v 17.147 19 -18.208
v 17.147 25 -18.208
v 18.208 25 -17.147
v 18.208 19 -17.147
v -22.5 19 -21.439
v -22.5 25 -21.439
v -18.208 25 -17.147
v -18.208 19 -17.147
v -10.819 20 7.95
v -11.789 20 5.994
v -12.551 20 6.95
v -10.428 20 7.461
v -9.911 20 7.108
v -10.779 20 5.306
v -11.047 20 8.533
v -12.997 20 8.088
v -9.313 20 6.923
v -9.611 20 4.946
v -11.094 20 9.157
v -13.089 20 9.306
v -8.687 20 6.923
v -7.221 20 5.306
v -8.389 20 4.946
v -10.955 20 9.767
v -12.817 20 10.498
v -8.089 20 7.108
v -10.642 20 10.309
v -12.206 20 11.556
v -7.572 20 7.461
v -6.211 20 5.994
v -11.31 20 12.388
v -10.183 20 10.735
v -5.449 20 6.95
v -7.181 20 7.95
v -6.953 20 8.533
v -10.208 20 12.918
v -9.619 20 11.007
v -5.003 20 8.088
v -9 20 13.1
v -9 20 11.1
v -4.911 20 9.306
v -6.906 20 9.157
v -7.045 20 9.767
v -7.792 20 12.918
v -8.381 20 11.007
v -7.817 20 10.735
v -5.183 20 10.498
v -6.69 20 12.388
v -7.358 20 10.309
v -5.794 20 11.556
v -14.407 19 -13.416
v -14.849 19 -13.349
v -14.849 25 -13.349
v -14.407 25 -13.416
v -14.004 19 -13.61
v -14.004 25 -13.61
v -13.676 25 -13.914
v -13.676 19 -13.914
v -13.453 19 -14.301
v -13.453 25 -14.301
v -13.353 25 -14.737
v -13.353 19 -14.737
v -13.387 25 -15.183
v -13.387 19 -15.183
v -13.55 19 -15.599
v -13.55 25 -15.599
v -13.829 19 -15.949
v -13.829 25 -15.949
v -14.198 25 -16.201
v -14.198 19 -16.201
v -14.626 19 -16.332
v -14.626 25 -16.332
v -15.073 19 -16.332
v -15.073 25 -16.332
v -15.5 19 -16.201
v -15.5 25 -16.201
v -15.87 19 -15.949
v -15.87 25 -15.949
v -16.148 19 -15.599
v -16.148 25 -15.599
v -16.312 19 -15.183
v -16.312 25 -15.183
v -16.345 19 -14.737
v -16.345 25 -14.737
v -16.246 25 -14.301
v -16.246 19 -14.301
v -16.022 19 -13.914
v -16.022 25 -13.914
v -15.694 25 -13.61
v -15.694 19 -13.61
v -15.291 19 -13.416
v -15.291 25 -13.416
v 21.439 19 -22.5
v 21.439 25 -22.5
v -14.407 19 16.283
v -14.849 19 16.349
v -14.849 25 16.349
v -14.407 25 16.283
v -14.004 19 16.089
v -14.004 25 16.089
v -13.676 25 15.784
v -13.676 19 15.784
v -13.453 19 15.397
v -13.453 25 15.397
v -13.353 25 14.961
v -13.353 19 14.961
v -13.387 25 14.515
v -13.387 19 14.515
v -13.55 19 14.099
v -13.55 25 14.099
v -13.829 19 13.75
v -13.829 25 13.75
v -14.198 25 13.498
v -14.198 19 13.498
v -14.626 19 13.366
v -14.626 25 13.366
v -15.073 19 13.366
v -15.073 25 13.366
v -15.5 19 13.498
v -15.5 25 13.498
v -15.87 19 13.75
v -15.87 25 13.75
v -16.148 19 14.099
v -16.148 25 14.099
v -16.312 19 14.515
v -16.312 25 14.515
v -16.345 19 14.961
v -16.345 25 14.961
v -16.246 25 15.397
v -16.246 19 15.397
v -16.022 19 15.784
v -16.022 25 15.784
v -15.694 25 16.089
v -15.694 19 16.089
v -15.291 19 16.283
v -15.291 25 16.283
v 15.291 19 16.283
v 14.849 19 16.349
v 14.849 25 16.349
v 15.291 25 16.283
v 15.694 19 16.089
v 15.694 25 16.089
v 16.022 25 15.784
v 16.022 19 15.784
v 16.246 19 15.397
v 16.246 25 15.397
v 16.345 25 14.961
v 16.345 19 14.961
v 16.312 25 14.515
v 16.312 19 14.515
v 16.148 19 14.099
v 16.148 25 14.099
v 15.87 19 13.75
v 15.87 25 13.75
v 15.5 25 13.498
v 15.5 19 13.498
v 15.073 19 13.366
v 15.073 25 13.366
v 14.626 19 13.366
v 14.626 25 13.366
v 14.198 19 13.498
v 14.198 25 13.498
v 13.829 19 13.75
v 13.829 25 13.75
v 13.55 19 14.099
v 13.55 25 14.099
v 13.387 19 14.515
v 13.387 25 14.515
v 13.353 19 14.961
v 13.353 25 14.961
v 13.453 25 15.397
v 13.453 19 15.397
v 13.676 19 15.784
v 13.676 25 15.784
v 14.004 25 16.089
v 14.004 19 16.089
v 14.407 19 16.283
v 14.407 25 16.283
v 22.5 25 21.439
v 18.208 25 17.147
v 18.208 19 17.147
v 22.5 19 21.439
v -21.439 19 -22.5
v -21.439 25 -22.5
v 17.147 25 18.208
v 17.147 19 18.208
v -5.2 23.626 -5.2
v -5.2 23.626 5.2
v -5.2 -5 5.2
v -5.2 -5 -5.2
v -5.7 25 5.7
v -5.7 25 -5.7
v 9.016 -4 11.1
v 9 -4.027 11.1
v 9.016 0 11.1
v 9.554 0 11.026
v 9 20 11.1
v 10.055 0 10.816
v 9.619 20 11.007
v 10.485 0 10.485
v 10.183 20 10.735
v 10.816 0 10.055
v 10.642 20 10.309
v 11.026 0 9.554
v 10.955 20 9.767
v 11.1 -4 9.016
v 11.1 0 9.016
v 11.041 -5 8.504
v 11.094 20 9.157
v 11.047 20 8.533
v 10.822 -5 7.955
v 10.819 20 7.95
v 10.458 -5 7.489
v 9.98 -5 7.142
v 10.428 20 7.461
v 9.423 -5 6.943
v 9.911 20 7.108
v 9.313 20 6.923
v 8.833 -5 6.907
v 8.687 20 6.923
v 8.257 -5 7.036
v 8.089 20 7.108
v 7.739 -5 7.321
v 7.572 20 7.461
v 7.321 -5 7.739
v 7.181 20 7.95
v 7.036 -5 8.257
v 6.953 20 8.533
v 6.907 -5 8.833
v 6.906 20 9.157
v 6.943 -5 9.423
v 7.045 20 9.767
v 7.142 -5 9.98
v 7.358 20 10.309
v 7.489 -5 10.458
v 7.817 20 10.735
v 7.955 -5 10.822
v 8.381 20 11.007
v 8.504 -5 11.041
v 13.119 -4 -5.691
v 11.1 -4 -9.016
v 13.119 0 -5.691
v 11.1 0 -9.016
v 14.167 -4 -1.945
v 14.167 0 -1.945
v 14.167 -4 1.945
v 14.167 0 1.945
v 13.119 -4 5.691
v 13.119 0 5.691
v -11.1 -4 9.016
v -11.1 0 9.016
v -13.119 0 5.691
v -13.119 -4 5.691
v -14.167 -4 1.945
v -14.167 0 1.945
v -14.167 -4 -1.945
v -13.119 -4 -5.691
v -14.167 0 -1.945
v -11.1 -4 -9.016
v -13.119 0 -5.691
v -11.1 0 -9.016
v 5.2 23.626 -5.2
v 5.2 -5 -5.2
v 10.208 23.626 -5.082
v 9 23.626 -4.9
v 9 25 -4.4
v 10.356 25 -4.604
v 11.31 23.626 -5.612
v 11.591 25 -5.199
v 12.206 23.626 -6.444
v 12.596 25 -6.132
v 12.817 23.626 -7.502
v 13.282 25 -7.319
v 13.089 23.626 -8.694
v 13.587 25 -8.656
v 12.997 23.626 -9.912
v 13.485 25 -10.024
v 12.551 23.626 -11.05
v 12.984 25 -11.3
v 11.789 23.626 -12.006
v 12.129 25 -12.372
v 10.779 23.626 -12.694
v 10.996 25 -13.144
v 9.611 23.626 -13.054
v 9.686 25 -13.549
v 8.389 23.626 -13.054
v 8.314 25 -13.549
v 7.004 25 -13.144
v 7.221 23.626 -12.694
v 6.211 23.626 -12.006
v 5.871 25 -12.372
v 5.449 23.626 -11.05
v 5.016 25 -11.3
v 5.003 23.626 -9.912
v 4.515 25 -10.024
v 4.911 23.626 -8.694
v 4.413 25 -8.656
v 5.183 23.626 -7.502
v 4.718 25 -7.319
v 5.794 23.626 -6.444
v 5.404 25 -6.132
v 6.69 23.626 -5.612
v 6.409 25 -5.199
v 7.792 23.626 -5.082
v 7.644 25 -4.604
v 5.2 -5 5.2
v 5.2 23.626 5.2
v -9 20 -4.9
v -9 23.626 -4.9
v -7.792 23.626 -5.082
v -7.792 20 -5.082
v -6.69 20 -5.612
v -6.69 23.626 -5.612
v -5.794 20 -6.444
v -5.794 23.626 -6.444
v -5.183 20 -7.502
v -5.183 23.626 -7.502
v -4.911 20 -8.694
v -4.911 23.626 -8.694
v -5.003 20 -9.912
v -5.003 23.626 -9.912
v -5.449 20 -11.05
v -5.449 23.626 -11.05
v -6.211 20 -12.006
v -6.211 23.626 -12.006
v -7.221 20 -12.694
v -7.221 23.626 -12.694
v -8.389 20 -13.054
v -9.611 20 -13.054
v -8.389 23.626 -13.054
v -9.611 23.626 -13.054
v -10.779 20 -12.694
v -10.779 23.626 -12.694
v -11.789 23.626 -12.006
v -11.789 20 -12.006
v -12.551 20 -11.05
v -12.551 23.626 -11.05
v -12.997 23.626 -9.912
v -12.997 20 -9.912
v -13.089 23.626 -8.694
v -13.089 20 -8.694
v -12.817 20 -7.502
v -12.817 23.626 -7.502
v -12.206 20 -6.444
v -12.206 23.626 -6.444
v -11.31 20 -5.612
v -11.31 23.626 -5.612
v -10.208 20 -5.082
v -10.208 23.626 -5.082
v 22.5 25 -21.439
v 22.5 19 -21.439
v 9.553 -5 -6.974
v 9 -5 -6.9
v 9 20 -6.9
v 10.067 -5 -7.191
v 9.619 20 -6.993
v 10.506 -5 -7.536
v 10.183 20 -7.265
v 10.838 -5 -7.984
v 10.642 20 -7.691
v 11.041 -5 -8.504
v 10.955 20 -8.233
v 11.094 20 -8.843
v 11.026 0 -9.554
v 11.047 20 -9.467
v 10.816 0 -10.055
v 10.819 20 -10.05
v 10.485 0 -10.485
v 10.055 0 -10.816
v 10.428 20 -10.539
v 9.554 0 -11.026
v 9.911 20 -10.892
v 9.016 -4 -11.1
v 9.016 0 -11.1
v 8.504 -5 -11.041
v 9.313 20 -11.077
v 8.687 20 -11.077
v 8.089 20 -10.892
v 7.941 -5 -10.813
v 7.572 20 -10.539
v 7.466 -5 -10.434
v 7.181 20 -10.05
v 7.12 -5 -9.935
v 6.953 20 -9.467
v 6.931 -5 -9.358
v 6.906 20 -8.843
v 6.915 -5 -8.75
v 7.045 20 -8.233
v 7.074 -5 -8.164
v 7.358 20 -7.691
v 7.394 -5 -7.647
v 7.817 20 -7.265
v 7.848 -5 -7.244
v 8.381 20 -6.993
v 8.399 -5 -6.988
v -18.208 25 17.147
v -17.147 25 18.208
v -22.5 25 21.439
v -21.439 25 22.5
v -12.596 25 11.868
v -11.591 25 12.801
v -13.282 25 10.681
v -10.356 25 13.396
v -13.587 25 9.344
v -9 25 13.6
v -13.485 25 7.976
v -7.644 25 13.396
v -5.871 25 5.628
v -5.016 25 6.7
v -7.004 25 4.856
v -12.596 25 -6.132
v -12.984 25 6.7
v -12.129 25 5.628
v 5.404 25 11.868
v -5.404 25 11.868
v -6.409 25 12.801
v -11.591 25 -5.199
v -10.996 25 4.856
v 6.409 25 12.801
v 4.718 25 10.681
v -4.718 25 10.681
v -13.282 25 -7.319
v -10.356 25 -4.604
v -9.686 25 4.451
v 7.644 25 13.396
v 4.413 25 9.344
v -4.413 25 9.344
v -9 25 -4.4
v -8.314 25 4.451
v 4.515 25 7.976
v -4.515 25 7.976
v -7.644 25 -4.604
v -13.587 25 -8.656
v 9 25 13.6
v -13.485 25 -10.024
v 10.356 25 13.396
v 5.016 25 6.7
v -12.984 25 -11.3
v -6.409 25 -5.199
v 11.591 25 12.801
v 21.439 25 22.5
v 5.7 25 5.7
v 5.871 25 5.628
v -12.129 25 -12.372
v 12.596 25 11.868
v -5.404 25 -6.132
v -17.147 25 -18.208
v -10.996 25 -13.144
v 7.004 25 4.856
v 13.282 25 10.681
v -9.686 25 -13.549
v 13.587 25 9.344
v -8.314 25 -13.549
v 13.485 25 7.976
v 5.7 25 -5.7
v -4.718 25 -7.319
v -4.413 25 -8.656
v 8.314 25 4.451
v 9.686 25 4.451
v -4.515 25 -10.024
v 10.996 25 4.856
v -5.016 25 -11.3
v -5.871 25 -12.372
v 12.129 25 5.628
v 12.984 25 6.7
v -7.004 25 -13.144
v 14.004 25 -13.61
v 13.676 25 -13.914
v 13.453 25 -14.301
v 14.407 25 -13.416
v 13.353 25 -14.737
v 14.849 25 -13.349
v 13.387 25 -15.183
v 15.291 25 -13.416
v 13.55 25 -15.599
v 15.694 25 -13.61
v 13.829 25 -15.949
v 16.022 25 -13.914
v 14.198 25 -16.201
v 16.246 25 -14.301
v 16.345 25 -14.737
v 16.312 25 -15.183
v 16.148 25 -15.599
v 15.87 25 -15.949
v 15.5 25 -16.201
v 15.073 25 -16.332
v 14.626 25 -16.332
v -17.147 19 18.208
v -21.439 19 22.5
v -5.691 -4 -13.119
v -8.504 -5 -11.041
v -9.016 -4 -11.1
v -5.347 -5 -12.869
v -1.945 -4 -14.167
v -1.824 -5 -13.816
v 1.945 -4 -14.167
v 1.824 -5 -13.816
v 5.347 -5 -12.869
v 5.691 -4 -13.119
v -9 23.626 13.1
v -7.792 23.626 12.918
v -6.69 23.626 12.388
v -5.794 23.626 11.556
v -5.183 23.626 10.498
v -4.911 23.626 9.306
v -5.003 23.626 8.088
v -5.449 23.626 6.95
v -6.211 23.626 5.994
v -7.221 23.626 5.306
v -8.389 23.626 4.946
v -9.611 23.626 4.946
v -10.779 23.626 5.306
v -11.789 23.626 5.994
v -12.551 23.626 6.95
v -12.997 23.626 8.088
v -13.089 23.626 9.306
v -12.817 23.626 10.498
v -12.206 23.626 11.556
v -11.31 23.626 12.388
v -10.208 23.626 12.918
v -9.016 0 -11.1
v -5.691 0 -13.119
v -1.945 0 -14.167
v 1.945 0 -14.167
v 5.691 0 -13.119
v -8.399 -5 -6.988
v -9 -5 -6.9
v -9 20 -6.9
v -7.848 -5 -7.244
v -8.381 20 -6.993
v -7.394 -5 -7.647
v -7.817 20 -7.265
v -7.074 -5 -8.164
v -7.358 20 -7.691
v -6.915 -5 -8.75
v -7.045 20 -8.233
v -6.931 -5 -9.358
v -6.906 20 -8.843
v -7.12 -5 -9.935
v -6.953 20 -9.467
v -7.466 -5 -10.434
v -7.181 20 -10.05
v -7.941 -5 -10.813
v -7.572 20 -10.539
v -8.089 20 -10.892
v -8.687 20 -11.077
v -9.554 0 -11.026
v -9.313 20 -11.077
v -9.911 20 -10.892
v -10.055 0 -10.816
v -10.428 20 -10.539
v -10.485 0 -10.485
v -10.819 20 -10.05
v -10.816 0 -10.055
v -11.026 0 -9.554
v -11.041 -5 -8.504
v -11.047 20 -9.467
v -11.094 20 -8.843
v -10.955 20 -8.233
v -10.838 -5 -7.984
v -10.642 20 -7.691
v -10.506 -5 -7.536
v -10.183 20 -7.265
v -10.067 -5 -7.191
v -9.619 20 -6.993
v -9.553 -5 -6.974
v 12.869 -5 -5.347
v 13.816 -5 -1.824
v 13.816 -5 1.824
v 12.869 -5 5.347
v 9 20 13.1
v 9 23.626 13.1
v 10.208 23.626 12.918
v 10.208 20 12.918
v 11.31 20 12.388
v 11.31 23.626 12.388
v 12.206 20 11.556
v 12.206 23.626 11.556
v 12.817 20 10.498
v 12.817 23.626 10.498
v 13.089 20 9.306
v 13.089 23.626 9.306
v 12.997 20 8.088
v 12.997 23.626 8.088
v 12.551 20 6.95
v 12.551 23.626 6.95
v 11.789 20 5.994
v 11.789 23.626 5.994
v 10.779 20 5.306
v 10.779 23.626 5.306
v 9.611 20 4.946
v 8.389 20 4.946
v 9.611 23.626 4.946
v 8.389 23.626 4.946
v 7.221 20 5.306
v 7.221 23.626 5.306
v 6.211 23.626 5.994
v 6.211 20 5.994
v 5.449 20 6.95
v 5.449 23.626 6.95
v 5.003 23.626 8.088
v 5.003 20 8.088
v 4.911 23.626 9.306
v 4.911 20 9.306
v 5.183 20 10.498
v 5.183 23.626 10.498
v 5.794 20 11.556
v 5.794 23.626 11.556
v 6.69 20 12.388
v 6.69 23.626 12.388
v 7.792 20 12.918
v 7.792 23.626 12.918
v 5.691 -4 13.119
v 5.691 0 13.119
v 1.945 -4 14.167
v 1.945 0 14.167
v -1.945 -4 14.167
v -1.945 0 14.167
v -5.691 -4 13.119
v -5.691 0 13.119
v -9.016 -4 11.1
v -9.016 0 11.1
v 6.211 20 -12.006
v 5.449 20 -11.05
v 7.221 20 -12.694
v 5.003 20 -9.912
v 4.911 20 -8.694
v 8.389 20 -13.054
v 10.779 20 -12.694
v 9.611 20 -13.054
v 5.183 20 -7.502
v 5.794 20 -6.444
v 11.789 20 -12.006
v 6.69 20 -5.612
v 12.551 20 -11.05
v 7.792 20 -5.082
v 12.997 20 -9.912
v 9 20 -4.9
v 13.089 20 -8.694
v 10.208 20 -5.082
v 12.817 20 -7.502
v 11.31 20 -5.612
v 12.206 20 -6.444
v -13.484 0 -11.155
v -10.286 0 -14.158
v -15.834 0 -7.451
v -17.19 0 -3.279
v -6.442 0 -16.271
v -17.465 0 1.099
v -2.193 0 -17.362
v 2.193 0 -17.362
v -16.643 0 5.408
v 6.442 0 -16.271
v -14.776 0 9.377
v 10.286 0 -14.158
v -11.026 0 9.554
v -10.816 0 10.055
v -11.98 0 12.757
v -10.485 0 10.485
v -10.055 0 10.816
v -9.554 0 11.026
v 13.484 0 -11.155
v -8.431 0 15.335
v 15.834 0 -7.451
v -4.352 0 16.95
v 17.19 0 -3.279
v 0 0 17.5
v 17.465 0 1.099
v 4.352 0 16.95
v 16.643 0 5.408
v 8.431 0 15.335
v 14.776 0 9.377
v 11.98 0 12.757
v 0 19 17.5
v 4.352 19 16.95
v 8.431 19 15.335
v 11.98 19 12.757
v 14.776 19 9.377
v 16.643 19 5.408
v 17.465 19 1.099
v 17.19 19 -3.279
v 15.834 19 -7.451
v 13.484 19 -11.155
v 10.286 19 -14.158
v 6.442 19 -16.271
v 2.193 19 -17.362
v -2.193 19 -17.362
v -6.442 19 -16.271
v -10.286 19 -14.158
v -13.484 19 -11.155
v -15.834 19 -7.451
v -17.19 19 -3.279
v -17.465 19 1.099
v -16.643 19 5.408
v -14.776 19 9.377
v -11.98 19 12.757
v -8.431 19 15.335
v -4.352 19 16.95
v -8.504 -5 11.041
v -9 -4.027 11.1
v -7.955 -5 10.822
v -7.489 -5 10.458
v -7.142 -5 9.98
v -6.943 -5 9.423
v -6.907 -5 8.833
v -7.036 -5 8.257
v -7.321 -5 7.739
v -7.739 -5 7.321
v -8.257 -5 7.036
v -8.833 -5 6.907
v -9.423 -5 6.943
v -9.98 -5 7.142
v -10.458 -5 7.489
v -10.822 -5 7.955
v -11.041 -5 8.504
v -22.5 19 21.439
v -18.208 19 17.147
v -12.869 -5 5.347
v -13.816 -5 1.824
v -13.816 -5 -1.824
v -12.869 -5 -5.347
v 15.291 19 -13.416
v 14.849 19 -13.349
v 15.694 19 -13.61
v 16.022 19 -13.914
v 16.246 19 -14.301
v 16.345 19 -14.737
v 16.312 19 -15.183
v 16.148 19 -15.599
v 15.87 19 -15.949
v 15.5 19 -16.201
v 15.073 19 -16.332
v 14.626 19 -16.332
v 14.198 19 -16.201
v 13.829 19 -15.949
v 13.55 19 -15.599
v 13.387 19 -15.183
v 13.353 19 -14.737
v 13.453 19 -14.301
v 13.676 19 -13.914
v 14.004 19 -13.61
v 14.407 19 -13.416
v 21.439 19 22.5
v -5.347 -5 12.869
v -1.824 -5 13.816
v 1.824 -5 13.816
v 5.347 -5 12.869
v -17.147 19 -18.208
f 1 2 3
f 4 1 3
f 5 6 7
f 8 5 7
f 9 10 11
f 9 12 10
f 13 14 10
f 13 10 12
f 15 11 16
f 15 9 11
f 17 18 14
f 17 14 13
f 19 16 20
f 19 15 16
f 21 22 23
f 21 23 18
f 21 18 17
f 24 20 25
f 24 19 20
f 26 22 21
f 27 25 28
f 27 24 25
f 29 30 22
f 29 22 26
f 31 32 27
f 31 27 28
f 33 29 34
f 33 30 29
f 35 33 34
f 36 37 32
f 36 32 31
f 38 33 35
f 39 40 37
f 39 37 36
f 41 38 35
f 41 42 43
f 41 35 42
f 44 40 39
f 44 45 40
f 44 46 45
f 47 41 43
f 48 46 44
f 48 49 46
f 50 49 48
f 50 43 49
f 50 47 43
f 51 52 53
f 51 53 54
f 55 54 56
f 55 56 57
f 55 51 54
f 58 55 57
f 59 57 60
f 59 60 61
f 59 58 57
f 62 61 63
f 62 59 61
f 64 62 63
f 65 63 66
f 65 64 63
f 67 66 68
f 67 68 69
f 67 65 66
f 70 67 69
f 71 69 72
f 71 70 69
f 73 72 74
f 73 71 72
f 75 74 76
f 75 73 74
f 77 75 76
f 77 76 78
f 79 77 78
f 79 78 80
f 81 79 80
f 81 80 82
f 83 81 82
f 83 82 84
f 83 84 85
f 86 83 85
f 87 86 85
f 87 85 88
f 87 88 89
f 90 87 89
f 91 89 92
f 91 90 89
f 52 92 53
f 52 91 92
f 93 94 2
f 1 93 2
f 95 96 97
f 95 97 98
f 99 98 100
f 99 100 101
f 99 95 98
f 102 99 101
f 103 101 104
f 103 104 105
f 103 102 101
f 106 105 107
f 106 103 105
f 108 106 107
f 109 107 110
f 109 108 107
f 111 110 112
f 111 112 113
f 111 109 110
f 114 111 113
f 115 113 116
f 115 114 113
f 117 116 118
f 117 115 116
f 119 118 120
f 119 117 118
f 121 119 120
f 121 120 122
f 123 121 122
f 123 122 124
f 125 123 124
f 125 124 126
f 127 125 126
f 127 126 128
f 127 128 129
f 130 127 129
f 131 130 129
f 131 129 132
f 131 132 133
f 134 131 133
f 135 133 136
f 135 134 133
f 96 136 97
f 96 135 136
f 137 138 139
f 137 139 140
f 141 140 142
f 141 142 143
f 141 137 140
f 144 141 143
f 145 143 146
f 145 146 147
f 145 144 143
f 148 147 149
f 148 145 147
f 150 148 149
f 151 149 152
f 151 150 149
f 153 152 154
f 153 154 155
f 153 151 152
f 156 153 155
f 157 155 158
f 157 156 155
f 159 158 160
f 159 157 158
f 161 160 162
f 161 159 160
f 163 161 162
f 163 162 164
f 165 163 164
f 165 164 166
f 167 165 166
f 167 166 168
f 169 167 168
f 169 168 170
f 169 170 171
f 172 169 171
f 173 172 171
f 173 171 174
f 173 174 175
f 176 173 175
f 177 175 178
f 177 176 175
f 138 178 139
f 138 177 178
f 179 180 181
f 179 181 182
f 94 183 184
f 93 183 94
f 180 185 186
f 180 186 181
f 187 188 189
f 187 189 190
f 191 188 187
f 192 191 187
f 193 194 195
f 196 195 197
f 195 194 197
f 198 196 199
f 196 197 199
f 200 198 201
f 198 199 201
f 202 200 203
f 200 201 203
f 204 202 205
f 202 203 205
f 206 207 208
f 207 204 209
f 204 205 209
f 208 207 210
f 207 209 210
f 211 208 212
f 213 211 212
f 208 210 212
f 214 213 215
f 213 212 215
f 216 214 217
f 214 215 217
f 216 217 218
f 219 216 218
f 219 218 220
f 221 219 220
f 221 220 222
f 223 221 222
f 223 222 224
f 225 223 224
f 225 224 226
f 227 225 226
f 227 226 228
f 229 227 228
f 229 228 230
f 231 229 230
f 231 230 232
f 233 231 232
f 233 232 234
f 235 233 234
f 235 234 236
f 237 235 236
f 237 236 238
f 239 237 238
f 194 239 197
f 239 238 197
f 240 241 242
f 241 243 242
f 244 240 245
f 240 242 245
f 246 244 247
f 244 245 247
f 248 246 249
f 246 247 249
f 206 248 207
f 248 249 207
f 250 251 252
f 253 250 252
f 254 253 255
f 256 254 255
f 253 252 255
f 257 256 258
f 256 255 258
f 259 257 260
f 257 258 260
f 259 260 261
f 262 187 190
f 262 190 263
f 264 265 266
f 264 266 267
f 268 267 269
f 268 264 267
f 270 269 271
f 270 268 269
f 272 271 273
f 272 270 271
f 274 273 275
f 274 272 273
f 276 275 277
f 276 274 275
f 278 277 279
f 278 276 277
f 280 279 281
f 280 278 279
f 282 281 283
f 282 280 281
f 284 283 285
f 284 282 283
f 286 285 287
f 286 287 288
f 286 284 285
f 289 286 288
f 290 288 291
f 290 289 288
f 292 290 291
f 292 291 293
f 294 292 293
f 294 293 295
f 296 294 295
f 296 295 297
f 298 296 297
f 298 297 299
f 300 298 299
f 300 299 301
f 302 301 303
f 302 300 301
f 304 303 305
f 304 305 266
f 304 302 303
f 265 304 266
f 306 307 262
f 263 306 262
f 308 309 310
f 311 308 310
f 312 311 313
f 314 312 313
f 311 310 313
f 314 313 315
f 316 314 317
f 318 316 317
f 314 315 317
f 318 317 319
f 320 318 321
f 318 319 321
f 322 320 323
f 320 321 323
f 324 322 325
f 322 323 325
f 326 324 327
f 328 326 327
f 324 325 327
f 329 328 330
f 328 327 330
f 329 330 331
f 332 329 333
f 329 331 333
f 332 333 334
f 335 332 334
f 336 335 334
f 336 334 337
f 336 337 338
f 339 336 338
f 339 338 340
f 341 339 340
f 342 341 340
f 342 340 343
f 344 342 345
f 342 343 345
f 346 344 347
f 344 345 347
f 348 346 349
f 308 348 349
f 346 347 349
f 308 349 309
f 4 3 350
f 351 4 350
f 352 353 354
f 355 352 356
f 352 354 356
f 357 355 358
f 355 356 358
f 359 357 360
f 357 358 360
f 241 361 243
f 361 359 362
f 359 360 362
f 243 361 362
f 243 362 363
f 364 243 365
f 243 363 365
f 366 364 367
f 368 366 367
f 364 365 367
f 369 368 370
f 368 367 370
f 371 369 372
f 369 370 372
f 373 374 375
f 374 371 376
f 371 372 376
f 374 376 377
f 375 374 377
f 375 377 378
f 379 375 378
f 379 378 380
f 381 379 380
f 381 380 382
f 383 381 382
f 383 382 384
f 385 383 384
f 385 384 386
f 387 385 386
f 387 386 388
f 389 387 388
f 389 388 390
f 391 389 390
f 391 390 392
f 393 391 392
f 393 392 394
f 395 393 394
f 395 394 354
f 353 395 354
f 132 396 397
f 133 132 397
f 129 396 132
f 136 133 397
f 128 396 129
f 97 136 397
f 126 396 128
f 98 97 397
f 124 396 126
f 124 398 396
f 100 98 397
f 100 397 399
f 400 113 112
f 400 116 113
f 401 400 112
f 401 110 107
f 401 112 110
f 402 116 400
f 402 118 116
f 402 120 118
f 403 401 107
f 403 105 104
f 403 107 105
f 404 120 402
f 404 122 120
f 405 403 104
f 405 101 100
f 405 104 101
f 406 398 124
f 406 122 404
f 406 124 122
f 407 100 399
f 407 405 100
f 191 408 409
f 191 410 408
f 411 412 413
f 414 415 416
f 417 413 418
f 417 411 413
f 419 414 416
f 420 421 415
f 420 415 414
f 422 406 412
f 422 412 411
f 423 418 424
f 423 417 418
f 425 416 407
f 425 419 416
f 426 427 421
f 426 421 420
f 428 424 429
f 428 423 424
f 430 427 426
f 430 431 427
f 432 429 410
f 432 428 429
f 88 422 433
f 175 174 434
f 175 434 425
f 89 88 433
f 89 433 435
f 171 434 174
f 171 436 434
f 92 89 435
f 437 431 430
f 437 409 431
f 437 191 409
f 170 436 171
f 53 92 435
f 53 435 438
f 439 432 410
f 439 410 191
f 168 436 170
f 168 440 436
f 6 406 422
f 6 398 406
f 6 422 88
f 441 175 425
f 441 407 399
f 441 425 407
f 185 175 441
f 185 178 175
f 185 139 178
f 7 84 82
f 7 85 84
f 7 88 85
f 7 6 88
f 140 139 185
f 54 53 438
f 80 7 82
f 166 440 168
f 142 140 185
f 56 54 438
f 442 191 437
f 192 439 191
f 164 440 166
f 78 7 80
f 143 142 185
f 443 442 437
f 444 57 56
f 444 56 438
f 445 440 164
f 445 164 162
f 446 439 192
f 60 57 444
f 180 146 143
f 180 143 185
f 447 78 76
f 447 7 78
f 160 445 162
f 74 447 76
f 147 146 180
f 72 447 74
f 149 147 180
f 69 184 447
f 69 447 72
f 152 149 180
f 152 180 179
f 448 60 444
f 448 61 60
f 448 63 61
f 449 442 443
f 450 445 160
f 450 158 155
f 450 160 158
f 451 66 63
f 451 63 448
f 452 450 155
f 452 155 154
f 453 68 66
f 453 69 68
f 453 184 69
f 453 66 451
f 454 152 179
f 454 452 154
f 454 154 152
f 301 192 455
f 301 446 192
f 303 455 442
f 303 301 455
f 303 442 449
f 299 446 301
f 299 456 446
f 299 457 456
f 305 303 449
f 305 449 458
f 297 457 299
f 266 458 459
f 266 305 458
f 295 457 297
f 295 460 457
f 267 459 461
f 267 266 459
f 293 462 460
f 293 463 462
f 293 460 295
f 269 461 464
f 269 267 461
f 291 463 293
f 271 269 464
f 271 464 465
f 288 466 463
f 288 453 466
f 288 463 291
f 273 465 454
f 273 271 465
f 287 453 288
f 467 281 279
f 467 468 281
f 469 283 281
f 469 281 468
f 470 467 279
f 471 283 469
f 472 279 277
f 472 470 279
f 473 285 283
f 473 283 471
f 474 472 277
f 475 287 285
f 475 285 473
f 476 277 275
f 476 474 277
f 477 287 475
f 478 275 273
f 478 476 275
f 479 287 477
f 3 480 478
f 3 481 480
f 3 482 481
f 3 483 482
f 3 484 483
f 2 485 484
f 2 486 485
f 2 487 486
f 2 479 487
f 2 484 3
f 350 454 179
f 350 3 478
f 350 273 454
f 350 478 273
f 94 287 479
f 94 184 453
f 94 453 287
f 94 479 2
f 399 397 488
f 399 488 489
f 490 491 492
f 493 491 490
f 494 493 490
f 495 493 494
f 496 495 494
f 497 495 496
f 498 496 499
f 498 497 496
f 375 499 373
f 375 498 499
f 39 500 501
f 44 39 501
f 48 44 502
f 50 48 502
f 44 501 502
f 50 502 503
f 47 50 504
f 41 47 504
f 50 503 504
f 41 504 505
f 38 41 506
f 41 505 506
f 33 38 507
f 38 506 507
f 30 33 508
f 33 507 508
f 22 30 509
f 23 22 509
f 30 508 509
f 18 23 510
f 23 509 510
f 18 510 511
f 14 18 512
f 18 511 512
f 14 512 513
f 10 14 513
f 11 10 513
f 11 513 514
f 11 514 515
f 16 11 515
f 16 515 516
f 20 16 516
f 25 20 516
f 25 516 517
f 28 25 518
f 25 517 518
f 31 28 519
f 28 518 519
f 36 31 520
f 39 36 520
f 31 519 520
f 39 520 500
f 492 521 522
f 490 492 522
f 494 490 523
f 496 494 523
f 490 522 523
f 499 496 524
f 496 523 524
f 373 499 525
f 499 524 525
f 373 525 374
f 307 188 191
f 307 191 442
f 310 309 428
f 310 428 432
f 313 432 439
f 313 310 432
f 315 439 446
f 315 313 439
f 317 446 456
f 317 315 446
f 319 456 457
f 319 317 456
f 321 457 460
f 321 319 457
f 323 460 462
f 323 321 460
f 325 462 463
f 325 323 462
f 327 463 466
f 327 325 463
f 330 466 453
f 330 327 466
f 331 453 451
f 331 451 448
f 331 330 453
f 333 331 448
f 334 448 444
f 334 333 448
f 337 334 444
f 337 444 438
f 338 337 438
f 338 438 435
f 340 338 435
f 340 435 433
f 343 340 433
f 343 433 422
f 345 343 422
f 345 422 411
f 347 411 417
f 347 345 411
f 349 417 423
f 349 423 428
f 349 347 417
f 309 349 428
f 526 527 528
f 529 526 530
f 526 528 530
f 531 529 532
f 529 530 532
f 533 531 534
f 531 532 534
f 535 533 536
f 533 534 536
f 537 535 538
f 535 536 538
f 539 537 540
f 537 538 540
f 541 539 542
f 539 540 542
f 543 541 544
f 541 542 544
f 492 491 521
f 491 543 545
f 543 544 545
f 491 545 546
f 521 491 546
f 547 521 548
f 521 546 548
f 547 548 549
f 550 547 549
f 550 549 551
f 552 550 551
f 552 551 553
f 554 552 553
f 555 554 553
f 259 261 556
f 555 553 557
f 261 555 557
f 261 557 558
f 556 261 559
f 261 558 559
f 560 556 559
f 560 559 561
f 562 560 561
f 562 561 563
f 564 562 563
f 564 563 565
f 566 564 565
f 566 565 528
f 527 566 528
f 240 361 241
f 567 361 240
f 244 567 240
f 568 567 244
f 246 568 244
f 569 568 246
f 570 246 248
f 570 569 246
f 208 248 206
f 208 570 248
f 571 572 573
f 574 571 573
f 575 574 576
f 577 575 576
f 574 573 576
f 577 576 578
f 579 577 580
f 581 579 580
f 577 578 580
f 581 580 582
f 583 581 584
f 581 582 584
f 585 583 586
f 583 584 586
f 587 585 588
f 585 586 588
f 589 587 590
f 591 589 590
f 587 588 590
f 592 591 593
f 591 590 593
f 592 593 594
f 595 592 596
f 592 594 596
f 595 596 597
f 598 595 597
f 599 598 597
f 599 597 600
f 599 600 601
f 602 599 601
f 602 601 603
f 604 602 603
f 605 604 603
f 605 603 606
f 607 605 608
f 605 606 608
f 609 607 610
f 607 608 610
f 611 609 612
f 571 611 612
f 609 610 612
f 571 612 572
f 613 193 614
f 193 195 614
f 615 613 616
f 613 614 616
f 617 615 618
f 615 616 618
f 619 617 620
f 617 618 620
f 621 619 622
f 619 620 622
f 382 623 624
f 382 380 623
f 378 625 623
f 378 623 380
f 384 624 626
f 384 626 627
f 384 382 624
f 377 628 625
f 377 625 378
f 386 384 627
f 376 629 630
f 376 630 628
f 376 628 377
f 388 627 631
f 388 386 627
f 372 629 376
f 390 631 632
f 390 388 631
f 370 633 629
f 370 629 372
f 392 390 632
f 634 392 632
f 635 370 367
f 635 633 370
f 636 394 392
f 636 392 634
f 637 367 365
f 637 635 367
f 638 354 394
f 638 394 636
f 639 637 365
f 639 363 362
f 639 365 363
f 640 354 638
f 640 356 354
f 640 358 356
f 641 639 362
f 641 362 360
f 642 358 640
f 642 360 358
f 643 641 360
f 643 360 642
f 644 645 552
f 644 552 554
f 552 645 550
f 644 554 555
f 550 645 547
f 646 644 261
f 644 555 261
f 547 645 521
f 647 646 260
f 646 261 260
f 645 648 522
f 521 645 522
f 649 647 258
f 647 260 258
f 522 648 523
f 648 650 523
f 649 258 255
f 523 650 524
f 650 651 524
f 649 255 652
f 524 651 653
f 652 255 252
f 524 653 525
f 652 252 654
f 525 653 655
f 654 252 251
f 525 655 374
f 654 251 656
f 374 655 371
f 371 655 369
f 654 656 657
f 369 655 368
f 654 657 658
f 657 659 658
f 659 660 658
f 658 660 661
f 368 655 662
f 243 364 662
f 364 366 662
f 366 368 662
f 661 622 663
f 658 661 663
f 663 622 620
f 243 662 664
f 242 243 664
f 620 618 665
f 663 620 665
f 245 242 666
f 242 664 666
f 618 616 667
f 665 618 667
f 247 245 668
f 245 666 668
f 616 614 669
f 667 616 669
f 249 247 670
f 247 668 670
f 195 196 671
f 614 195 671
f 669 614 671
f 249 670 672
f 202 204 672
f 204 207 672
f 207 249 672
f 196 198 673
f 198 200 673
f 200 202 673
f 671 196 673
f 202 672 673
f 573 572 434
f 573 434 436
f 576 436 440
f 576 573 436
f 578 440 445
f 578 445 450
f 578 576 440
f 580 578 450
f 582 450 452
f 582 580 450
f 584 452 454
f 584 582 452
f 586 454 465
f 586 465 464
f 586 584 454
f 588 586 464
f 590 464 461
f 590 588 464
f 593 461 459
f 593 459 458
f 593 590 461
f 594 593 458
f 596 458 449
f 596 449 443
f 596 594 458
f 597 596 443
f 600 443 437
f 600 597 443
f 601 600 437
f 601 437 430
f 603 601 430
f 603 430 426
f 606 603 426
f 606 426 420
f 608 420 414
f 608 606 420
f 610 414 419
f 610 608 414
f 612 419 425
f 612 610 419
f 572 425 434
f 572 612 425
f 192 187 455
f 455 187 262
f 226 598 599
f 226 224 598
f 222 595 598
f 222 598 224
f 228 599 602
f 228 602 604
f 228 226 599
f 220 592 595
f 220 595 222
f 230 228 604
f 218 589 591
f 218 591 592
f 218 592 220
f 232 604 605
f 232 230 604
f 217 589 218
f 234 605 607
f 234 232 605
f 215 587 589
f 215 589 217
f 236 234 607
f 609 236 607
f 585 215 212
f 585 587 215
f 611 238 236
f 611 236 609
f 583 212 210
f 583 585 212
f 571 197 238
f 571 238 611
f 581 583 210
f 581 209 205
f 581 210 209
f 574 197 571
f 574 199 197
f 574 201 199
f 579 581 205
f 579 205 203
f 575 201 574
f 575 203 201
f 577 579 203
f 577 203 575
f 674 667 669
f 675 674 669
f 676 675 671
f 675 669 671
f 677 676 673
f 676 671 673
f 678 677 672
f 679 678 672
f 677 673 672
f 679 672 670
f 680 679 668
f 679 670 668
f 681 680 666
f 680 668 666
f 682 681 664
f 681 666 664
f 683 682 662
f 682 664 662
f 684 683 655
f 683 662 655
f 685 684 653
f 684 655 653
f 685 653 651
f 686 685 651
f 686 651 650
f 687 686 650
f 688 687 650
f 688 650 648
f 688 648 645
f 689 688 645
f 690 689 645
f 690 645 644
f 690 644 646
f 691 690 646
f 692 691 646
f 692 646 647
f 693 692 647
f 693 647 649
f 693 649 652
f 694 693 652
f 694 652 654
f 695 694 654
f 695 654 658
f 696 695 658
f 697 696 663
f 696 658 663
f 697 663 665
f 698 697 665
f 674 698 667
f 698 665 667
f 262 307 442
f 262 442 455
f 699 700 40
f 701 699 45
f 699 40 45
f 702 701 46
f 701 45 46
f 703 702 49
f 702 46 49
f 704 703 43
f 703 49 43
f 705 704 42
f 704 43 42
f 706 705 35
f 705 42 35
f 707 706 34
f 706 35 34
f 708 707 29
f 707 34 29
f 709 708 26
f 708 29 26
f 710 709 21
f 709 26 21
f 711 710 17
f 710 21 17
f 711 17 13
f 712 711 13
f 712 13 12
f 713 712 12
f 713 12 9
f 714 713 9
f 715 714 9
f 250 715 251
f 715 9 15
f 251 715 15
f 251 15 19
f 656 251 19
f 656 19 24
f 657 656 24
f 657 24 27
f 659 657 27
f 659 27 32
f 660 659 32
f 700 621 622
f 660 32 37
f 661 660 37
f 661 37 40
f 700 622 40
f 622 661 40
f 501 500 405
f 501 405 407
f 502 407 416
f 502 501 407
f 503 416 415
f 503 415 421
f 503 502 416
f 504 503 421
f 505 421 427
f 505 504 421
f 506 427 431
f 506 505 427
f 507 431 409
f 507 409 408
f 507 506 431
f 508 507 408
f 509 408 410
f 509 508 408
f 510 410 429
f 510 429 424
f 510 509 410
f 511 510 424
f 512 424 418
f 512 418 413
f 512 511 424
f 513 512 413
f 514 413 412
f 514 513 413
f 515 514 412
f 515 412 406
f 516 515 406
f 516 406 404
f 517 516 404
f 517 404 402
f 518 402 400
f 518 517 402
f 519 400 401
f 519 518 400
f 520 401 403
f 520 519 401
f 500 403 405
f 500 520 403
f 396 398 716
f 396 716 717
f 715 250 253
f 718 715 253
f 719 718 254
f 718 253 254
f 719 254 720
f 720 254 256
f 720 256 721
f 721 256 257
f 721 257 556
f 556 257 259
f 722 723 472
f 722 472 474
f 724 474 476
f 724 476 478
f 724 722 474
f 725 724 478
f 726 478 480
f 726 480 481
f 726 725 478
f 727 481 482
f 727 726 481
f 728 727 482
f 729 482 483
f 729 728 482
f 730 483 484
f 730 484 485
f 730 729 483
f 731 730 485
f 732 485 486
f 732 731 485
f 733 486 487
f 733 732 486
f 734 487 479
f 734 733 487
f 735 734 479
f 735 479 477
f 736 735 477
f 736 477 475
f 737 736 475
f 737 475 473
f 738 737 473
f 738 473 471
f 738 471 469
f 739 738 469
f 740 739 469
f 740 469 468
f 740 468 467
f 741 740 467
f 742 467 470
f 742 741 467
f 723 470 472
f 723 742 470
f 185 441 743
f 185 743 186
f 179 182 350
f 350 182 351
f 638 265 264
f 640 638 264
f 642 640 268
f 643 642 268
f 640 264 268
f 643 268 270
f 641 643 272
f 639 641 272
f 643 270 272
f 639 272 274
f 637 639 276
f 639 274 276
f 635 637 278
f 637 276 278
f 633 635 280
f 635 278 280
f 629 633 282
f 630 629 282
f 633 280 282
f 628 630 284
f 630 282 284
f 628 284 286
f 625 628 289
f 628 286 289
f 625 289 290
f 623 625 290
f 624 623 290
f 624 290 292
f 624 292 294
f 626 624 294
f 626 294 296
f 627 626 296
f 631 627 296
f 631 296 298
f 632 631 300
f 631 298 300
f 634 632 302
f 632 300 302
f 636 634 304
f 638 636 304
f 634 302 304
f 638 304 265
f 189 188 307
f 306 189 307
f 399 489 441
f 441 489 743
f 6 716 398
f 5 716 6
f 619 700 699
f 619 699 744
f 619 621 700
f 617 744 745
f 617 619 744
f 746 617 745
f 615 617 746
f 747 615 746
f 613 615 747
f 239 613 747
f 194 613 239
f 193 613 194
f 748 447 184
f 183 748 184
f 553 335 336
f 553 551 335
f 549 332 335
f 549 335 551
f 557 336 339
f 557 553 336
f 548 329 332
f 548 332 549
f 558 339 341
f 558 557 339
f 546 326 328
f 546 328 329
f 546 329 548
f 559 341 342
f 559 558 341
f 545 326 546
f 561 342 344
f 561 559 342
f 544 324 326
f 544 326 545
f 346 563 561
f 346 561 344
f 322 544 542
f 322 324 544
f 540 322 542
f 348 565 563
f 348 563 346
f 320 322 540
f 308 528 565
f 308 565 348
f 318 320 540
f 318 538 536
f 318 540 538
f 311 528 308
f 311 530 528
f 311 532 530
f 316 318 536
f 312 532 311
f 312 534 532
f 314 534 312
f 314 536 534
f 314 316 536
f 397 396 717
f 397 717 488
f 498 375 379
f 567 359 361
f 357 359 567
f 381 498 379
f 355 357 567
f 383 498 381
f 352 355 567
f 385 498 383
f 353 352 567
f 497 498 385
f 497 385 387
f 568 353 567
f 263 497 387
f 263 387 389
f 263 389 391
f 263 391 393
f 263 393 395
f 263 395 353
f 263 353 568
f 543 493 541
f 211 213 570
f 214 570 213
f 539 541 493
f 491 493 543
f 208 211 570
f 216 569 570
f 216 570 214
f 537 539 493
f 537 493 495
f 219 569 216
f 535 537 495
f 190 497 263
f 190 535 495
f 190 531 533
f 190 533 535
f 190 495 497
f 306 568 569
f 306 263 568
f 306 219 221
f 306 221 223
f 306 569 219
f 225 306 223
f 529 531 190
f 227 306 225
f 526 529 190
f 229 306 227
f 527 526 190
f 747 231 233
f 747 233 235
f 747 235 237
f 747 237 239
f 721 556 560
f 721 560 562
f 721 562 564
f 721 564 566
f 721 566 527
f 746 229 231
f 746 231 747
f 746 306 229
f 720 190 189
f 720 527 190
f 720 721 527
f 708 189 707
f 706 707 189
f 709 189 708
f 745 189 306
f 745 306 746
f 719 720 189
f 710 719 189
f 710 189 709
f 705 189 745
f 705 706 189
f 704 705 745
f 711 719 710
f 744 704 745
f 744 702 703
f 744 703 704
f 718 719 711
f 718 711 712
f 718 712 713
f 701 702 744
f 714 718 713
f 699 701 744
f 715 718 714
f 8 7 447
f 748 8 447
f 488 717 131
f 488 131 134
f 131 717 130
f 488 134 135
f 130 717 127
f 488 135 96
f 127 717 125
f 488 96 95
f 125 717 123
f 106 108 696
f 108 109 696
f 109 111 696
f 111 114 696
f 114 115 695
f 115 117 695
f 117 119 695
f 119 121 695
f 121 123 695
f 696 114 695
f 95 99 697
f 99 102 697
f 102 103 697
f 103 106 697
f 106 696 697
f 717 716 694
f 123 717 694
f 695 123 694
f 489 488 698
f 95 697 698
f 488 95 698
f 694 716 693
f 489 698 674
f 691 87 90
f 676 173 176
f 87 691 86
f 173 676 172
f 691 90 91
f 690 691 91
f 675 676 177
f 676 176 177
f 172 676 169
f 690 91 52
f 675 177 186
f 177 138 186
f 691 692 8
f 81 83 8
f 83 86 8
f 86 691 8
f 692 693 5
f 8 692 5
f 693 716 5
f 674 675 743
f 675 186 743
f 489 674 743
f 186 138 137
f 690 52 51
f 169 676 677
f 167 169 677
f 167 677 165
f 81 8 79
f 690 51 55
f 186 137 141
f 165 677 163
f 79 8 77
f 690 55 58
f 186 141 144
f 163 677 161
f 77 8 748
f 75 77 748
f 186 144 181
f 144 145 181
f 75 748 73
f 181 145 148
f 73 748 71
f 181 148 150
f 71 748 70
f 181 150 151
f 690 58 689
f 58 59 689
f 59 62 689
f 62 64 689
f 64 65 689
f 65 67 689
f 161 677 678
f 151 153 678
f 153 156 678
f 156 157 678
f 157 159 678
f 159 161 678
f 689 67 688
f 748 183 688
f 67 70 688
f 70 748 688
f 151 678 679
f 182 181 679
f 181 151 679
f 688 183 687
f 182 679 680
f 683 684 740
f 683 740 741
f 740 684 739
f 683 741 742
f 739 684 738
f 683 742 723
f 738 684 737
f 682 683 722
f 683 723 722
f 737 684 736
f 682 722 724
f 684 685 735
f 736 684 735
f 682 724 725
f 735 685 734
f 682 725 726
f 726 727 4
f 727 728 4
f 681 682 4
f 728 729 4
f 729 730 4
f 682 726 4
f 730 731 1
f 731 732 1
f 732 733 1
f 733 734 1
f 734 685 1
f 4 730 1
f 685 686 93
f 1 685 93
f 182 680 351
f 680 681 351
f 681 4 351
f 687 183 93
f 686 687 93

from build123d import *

# Parameters (mm, degrees)
SKETCH1_R           = 17.5
BOSS_EXTRUDE1_DEPTH = 25
SKETCH3_R           = 14.3
BOSS_EXTRUDE2_DEPTH = 5
SKETCH4_W           = 10.4
SKETCH4_H           = 10.4
CUT_EXTRUDE1_DEPTH  = 39.890872965
SKETCH6_R           = 2.1
CUT_EXTRUDE2_DEPTH  = 39.890872965
CHAMFER1_SIZE       = 0.363970234
CHAMFER1_SIZE_2     = 1
SKETCH7_R           = 4.1
CUT_EXTRUDE3_DEPTH  = 5
CHAMFER2_SIZE       = 0.5
CHAMFER2_SIZE2      = 1.37373871
BOSS_EXTRUDE3_START = -6
SKETCH8_W           = 45
SKETCH8_H           = 45
SKETCH8_R           = 17.5
SKETCH8_R_2         = 1.5
BOSS_EXTRUDE3_DEPTH = 6
CUT_EXTRUDE4_DEPTH  = 44.73213928
CHAMFER3_SIZE       = 0.5
CHAMFER3_SIZE2      = 1.37373871


with BuildPart() as part:
    # Sketch1 → Boss-Extrude1 (new body)
    with BuildSketch(Plane(origin=(0, 0, 0), x_dir=(1, 0, 0), z_dir=(0, 1, 0))):
        with Locations(Location((0, 0, 0), (0, 0, 270))):
            Circle(SKETCH1_R)
    extrude(amount=BOSS_EXTRUDE1_DEPTH)

    # Sketch3 → Boss-Extrude2 (add)
    with BuildSketch(Plane.XZ):
        with Locations(Location((0, 0, 0), (0, 0, 90))):
            Circle(SKETCH3_R)
    extrude(amount=BOSS_EXTRUDE2_DEPTH)

    # Sketch4 → Cut-Extrude1 (cut, through all)
    with BuildSketch(Plane(origin=(0, 25, 0), x_dir=(1, 0, 0), z_dir=(0, 1, 0))):
        Rectangle(SKETCH4_W, SKETCH4_H)
    extrude(amount=-CUT_EXTRUDE1_DEPTH, mode=Mode.SUBTRACT)

    # Sketch6 → Cut-Extrude2 (cut, through all)
    with BuildSketch(Plane(origin=(0, 25, 0), x_dir=(1, 0, 0), z_dir=(0, 1, 0))):
        with Locations(Location((9, -9, 0), (0, 0, 270))):
            Circle(SKETCH6_R)
        with Locations(Location((-9, -9, 0), (0, 0, 270))):
            Circle(SKETCH6_R)
        with Locations(Location((-9, 9, 0), (0, 0, 270))):
            Circle(SKETCH6_R)
        with Locations(Location((9, 9, 0), (0, 0, 270))):
            Circle(SKETCH6_R)
    extrude(amount=-CUT_EXTRUDE2_DEPTH, mode=Mode.SUBTRACT)

    # Chamfer1
    # the kernel refuses this chamfer: 1, 0.363970234 mm, written as the material it takes off along each edge
    with BuildSketch(Plane(origin=(0, -5, 0), x_dir=(-0.7601968687413804, 0, 0.649692789521171), z_dir=(-0.649692789521171, 0, -0.7601968687413804))) as chamfer1_piece_1:
        Polygon((14.3 - CHAMFER1_SIZE, 0), (14.3, CHAMFER1_SIZE_2), (14.3, 0), align=None)
    revolve(axis=Axis((0, -5, 0), (0, 1, 0)), revolution_arc=98.963112953, mode=Mode.SUBTRACT)
    with BuildSketch(Plane(origin=(0, -5, 0), x_dir=(-0.6496927895211715, 0, 0.7601968687413799), z_dir=(0.7601968687413799, 0, 0.6496927895211715))) as chamfer1_piece_2:
        Polygon((14.3 - CHAMFER1_SIZE, 0), (14.3, -CHAMFER1_SIZE_2), (14.3, 0), align=None)
    revolve(axis=Axis((0, -5, 0), (0, -1, 0)), revolution_arc=98.963112953, mode=Mode.SUBTRACT)
    with BuildSketch(Plane(origin=(0, -5, 0), x_dir=(-0.7601968687413795, 0, -0.6496927895211719), z_dir=(-0.6496927895211719, 0, 0.7601968687413795))) as chamfer1_piece_3:
        Polygon((14.3, -CHAMFER1_SIZE_2), (14.3 - CHAMFER1_SIZE, 0), (14.3, 0), align=None)
    revolve(axis=Axis((0, -5, 0), (0, -1, 0)), revolution_arc=98.963112953, mode=Mode.SUBTRACT)
    with BuildSketch(Plane(origin=(0, -5, 0), x_dir=(0.6496927895211716, 0, -0.7601968687413798), z_dir=(-0.7601968687413798, 0, -0.6496927895211716))) as chamfer1_piece_4:
        Polygon((14.3, -CHAMFER1_SIZE_2), (14.3 - CHAMFER1_SIZE, 0), (14.3, 0), align=None)
    revolve(axis=Axis((0, -5, 0), (0, -1, 0)), revolution_arc=98.963112953, mode=Mode.SUBTRACT)

    # Sketch7 → Cut-Extrude3 (cut)
    with BuildSketch(Plane(origin=(0, 25, 0), x_dir=(1, 0, 0), z_dir=(0, 1, 0))):
        with Locations(Location((9, 9, 0), (0, 0, 270))):
            Circle(SKETCH7_R)
        with Locations(Location((-9, 9, 0), (0, 0, 270))):
            Circle(SKETCH7_R)
        with Locations(Location((-9, -9, 0), (0, 0, 270))):
            Circle(SKETCH7_R)
        with Locations(Location((9, -9, 0), (0, 0, 270))):
            Circle(SKETCH7_R)
    extrude(amount=-CUT_EXTRUDE3_DEPTH, mode=Mode.SUBTRACT)

    # Chamfer2
    chamfer2_edges = [part.edges().sort_by_distance(p)[0] for p in [
        (5.2, 25, 0),
        (0, 25, -5.2),
        (-5.2, 25, 0),
        (0, 25, 5.2),
    ]]
    chamfer2_side = [part.faces().sort_by_distance(p)[0] for p in [
        (0, 25, -17.005025253),
    ]]
    chamfer(chamfer2_edges, length=CHAMFER2_SIZE, length2=CHAMFER2_SIZE2, reference=chamfer2_side[0])

    # Sketch8 → Boss-Extrude3 (add)
    with BuildSketch(Plane(origin=(0, 25, 0), x_dir=(1, 0, 0), z_dir=(0, 1, 0)).offset(BOSS_EXTRUDE3_START)):
        Rectangle(SKETCH8_W, SKETCH8_H)
        with Locations(Location((0, 0, 0), (0, 0, 270))):
            Circle(SKETCH8_R, mode=Mode.SUBTRACT)
        with Locations(Location((-14.849242405, -14.849242405, 0), (0, 0, 270))):
            Circle(SKETCH8_R_2, mode=Mode.SUBTRACT)
        with Locations(Location((-14.849242405, 14.849242405, 0), (0, 0, 270))):
            Circle(SKETCH8_R_2, mode=Mode.SUBTRACT)
        with Locations(Location((14.849242405, 14.849242405, 0), (0, 0, 270))):
            Circle(SKETCH8_R_2, mode=Mode.SUBTRACT)
        with Locations(Location((14.849242405, -14.849242405, 0), (0, 0, 270))):
            Circle(SKETCH8_R_2, mode=Mode.SUBTRACT)
    extrude(amount=BOSS_EXTRUDE3_DEPTH)

    # Sketch10 → Cut-Extrude4 (cut, through all)
    with BuildSketch(Plane(origin=(0, 25, 0), x_dir=(1, 0, 0), z_dir=(0, 1, 0))):
        Polygon((-18.207999616, -17.147339444), (-17.147339444, -18.207999616), (-21.439339828, -22.5), (-22.5, -22.5), (-22.5, -21.439339828), align=None)
        Polygon((-22.5, 21.439339828), (-18.207999616, 17.147339444), (-17.147339444, 18.207999616), (-21.439339828, 22.5), (-22.5, 22.5), align=None)
        Polygon((21.439339828, 22.5), (17.147339444, 18.207999616), (18.207999616, 17.147339444), (22.5, 21.439339828), (22.5, 22.5), align=None)
        Polygon((17.147339444, -18.207999616), (18.207999616, -17.147339444), (22.5, -21.439339828), (22.5, -22.5), (21.439339828, -22.5), align=None)
    extrude(amount=-CUT_EXTRUDE4_DEPTH, mode=Mode.SUBTRACT)

    # Chamfer3
    chamfer3_edges = [part.edges().sort_by_distance(p)[0] for p in [
        (-9, 25, -13.1),
        (-9, 25, 4.9),
        (9, 25, 4.9),
        (9, 25, -13.1),
    ]]
    chamfer3_side = [part.faces().sort_by_distance(p)[0] for p in [
        (18.843339636, 25, -20.803999808),
    ]]
    chamfer(chamfer3_edges, length=CHAMFER3_SIZE, length2=CHAMFER3_SIZE2, reference=chamfer3_side[0])


solid = part.part
